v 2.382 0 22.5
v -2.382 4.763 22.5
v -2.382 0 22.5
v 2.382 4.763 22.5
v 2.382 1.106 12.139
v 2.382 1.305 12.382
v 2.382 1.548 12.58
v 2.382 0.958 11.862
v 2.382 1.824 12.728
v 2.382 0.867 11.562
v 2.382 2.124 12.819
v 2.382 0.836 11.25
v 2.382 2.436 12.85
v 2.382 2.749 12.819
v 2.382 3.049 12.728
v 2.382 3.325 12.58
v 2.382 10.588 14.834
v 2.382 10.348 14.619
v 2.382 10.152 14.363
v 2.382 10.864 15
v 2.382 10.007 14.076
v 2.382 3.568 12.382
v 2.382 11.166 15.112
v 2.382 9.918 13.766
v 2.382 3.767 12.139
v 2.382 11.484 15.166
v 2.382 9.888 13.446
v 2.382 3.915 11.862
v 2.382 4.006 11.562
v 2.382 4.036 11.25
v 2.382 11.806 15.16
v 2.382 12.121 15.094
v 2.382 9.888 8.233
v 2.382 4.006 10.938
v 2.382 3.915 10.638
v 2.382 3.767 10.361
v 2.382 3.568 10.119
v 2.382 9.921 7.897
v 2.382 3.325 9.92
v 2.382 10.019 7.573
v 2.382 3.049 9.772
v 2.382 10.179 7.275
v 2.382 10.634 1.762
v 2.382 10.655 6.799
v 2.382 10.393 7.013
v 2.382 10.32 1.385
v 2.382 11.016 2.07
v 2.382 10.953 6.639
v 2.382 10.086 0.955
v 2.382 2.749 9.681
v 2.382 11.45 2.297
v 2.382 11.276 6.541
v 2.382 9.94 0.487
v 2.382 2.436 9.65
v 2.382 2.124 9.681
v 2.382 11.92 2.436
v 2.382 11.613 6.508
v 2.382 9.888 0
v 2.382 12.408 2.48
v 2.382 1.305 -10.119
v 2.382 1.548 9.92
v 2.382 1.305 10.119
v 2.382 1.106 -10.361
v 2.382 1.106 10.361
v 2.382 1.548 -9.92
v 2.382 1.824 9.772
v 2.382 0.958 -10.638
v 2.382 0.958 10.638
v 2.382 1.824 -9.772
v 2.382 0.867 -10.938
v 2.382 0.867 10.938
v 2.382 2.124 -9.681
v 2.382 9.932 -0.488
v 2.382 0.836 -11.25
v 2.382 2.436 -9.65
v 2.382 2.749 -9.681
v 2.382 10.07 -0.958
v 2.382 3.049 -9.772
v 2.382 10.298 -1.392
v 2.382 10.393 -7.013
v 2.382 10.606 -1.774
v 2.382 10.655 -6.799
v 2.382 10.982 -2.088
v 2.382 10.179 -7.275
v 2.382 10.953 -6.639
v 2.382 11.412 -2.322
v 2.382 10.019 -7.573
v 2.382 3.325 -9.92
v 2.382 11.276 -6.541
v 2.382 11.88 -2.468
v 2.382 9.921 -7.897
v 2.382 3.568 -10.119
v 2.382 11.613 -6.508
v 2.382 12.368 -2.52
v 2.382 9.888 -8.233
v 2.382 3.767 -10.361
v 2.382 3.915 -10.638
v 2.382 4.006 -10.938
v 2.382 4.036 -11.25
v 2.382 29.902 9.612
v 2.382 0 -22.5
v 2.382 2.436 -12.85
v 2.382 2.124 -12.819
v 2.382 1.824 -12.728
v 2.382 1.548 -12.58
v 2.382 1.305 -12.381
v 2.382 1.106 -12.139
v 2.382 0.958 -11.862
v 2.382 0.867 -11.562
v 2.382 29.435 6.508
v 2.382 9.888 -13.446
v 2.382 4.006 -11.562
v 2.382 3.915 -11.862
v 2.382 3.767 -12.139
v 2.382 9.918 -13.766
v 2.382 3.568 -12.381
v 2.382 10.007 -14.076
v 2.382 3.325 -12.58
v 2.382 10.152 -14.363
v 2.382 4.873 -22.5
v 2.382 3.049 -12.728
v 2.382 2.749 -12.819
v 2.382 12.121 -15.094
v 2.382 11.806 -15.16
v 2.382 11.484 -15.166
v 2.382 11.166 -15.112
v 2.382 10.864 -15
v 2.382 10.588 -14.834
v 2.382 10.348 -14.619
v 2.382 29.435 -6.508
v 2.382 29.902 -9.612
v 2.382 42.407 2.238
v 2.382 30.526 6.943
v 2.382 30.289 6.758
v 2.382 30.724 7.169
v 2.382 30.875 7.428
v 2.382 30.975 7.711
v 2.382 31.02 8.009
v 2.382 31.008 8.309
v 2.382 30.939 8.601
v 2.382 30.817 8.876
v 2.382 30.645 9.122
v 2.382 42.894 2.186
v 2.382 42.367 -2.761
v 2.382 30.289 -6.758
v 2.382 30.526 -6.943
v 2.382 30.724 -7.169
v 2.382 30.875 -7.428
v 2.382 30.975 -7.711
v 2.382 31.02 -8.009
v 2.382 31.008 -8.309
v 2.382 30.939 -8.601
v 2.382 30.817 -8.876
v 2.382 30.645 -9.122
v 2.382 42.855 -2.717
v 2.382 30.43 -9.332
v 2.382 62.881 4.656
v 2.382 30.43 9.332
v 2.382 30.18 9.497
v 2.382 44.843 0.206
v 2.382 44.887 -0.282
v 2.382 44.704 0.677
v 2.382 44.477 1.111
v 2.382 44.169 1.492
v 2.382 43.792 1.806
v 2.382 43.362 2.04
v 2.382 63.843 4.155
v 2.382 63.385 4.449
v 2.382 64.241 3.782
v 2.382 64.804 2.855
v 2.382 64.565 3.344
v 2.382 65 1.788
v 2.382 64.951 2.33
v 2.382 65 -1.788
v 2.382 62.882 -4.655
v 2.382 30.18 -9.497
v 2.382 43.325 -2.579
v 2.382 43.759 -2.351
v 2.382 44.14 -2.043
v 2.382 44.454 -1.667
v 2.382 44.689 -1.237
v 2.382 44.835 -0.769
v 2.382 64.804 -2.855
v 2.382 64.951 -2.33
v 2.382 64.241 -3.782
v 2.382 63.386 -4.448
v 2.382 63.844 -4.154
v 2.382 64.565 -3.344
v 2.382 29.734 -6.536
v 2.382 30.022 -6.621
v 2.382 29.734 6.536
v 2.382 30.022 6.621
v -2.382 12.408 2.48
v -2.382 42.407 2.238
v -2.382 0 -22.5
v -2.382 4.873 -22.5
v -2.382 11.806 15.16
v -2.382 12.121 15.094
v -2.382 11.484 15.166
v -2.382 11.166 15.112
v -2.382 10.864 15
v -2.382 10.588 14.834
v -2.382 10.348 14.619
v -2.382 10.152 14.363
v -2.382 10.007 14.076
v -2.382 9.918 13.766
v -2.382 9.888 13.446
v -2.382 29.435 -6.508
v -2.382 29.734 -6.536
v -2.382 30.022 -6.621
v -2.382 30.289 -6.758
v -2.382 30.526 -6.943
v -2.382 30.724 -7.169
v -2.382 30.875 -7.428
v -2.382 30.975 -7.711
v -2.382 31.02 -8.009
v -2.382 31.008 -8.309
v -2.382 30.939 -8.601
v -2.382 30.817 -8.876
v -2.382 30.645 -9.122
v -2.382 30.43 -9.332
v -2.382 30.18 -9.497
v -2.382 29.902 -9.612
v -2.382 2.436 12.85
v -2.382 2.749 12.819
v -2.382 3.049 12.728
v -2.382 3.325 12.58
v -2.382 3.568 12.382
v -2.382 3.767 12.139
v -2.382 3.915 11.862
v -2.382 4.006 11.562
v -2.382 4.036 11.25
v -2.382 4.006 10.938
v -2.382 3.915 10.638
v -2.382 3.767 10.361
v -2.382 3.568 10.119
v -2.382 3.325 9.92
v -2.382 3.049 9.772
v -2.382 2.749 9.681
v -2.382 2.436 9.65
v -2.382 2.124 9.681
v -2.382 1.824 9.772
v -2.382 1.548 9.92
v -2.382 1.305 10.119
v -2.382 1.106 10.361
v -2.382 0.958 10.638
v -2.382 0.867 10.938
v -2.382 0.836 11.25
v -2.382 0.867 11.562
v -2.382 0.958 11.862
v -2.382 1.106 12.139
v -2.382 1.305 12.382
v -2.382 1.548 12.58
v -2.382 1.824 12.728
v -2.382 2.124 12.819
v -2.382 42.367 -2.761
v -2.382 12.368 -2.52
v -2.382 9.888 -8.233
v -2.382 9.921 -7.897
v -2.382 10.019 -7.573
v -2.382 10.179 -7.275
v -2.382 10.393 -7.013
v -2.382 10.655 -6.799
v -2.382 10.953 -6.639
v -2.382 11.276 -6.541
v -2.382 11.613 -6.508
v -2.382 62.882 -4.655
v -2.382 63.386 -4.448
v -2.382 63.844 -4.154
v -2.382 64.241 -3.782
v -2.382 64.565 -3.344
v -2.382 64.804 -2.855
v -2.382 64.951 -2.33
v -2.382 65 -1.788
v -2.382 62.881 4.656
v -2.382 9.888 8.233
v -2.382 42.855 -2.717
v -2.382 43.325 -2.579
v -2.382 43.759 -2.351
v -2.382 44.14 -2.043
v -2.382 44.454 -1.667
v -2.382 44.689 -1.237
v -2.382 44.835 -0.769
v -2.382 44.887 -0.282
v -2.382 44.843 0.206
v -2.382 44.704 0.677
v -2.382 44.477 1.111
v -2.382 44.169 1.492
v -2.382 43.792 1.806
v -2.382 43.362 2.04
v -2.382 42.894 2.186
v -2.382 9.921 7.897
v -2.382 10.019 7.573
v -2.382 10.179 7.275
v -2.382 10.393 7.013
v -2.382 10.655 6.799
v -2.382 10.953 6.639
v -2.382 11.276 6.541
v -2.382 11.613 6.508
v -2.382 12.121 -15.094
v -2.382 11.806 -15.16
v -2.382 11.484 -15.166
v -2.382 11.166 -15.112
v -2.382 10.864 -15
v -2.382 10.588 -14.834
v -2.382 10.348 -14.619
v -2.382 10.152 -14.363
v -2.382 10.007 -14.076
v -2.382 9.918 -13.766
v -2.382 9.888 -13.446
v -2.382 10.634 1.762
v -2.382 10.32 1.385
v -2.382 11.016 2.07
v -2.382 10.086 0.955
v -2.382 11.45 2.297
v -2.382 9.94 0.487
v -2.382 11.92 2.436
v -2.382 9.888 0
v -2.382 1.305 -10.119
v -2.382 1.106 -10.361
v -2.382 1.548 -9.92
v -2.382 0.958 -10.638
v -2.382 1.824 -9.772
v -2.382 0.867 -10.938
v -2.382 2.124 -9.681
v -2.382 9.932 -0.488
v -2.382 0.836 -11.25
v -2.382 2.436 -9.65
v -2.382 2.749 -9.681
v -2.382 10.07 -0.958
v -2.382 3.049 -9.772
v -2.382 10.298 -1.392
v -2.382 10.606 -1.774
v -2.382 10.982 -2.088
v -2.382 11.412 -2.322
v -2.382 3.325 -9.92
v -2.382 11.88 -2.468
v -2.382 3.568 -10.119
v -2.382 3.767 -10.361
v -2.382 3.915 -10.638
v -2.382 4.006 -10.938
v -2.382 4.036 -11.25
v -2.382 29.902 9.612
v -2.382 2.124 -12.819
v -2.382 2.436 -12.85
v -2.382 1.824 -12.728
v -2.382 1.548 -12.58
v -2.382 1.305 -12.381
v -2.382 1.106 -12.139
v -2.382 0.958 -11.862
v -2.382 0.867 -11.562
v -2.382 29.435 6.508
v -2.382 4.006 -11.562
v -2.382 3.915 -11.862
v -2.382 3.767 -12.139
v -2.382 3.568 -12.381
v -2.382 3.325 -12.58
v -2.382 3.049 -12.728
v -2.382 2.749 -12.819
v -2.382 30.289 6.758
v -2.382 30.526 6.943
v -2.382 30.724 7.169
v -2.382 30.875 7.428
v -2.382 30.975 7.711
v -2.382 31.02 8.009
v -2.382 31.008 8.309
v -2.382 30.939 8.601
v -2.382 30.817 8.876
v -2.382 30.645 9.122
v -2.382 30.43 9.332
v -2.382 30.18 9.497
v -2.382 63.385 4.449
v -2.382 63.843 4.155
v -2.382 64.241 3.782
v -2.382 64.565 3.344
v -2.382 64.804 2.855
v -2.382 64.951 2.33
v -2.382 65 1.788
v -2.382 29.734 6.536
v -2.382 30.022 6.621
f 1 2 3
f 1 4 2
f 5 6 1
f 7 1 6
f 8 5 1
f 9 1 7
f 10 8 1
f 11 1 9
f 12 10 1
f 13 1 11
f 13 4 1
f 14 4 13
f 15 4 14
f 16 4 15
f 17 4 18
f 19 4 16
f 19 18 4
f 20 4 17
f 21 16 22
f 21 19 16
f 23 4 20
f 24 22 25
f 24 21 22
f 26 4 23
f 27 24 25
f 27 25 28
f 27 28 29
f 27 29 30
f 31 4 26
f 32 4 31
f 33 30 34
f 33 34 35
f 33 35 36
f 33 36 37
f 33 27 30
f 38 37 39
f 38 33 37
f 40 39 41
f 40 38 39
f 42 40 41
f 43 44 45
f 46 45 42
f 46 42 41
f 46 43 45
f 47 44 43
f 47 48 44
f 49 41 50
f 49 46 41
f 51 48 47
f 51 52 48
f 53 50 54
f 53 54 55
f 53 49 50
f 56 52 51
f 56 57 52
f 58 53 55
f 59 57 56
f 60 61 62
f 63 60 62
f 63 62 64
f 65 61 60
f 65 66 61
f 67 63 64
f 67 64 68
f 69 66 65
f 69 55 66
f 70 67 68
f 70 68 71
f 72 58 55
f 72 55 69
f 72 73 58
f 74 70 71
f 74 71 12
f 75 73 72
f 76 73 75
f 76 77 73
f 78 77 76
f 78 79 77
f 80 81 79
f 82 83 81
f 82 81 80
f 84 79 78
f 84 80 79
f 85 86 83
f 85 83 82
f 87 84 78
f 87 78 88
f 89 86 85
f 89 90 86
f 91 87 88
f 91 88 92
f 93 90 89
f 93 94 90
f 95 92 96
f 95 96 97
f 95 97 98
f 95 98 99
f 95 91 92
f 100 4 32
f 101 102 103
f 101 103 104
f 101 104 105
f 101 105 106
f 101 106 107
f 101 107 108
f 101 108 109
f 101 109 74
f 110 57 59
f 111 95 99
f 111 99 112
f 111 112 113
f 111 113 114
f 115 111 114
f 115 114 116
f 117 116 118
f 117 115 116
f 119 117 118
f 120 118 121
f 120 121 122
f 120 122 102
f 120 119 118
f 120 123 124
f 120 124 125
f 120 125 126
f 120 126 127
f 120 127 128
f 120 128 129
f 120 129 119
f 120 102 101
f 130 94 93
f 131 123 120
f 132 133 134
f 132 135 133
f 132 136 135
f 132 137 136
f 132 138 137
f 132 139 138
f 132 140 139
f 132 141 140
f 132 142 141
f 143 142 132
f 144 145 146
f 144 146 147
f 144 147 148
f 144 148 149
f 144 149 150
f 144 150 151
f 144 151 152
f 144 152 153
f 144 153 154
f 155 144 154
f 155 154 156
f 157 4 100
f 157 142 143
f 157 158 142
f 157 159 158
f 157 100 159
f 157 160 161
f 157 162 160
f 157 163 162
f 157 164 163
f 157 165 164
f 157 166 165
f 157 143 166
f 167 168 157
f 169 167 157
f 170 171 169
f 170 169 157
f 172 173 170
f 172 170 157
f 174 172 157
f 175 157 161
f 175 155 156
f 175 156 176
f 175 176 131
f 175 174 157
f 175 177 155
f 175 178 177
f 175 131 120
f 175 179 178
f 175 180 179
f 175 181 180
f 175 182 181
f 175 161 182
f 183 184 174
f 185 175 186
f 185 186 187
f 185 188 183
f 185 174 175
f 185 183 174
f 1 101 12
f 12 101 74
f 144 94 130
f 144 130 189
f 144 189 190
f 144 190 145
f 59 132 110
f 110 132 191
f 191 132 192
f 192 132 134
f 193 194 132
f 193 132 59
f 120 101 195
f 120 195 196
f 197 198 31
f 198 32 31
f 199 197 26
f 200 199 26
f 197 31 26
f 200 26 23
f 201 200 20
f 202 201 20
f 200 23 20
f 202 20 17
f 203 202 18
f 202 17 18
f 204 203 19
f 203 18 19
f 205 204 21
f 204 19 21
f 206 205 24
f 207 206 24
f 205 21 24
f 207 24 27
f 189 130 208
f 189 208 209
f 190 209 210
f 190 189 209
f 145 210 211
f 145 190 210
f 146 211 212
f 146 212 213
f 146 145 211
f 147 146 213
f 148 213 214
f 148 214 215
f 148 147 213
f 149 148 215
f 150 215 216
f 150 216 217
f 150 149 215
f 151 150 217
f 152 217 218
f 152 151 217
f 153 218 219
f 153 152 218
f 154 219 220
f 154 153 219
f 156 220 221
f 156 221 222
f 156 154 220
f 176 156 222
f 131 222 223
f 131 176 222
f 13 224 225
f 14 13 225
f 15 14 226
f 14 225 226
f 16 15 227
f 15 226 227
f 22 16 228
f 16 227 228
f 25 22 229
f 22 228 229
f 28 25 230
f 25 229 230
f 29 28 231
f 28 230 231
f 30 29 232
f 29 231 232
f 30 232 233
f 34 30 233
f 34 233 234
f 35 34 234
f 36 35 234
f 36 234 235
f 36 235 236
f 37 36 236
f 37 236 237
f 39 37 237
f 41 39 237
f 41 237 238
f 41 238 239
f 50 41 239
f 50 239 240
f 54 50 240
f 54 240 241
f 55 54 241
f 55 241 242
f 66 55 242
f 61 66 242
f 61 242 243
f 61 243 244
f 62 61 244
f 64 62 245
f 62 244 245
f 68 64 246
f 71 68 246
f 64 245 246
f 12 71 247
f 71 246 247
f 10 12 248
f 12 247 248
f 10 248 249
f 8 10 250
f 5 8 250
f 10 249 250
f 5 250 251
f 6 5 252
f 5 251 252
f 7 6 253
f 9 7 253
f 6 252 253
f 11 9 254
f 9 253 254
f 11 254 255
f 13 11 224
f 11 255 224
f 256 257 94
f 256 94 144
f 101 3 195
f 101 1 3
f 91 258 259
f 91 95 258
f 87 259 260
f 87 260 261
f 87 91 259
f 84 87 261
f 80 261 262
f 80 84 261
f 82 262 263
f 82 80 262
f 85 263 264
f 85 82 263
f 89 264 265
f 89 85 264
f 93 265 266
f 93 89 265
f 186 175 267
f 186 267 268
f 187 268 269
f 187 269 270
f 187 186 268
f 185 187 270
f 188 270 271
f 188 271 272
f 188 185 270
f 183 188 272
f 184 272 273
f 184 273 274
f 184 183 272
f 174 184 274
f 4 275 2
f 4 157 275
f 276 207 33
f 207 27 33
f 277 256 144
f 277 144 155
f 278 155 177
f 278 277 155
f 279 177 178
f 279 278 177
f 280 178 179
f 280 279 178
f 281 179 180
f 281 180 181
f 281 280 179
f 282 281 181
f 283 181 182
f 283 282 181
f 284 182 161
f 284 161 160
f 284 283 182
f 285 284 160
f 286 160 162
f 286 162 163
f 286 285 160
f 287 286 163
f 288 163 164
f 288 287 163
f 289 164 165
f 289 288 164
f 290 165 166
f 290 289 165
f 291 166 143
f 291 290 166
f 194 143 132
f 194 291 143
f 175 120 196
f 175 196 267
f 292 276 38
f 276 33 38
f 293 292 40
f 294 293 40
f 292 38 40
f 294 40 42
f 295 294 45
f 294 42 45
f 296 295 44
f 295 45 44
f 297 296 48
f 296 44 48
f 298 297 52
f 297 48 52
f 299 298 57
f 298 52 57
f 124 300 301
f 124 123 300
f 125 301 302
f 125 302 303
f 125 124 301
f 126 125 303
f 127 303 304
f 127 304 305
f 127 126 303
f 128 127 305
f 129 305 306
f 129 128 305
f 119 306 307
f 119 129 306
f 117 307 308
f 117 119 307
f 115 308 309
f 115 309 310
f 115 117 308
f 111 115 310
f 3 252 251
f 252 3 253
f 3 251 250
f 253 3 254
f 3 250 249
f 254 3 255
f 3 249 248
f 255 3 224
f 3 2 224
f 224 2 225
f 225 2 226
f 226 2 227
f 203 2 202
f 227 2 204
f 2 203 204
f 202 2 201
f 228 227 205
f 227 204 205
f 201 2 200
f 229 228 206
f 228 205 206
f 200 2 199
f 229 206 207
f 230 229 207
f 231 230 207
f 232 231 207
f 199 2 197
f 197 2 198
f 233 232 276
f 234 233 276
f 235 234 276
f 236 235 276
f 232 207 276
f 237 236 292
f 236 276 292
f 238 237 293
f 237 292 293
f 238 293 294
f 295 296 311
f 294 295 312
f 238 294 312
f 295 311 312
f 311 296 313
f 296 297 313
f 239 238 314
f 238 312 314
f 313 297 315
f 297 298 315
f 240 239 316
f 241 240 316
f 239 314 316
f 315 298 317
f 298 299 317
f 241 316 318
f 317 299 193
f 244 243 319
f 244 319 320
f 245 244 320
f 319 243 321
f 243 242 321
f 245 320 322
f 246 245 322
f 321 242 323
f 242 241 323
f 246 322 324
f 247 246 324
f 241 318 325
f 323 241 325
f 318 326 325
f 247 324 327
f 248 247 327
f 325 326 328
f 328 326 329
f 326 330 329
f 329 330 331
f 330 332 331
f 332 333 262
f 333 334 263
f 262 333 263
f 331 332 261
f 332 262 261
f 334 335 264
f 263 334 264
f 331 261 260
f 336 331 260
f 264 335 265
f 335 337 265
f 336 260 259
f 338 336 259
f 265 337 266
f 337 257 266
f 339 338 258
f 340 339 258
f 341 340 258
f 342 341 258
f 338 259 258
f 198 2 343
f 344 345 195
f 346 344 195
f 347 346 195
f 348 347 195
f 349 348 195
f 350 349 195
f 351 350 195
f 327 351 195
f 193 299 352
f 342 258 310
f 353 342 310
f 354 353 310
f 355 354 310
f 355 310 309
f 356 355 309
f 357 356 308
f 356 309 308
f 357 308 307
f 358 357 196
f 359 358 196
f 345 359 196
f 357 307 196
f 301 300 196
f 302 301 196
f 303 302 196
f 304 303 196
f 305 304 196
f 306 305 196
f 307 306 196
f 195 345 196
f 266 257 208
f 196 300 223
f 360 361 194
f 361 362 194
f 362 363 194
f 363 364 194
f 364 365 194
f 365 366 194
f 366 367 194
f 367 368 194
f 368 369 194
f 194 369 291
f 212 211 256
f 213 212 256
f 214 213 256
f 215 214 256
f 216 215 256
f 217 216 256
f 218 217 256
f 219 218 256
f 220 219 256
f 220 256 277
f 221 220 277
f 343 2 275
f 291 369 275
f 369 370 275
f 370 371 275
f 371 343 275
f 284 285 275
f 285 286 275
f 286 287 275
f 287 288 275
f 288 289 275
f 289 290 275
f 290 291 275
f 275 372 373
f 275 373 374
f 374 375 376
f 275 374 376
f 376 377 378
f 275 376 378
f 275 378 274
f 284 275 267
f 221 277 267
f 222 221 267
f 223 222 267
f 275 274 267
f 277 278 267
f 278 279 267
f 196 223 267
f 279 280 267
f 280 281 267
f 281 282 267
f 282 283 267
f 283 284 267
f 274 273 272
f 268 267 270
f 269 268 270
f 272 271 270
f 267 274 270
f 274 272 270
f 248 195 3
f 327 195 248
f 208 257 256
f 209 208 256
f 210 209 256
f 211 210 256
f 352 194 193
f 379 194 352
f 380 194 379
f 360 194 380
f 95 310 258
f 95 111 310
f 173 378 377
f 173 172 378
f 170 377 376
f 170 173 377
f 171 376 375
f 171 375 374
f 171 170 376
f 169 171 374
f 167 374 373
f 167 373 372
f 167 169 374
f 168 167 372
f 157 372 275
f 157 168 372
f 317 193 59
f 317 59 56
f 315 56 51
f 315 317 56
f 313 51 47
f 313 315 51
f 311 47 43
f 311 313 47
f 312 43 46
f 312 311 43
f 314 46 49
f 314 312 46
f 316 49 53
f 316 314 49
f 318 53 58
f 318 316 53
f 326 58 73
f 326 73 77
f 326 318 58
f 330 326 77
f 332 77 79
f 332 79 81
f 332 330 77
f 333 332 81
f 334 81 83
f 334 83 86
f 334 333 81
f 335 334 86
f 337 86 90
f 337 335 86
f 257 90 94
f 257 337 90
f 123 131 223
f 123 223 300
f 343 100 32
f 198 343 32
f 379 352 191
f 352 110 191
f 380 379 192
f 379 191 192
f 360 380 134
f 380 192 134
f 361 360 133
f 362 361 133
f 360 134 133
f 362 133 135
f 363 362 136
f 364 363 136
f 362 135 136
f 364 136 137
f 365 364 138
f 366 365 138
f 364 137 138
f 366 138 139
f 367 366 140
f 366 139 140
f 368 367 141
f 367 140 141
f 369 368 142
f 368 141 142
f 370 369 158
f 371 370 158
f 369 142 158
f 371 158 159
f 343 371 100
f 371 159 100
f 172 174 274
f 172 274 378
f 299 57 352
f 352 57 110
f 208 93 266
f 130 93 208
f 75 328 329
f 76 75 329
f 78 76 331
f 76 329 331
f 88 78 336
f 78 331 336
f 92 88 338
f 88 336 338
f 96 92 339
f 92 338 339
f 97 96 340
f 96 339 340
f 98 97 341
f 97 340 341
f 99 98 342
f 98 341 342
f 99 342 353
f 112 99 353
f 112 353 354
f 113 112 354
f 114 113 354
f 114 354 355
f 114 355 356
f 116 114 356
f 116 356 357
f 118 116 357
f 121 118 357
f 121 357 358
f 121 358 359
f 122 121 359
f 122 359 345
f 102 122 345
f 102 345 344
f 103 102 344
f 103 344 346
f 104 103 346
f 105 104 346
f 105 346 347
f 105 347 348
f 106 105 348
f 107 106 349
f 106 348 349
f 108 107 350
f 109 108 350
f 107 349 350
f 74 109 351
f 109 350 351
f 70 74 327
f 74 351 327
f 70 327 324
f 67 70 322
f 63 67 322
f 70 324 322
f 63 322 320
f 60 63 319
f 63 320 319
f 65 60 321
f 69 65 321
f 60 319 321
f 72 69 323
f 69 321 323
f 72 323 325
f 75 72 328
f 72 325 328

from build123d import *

# Parameters (mm, degrees)
BOSS_EXTRUDE1_DEPTH       = 2.3815
M3_CLEARANCE_HOLE1_D      = 3.2
F_1_0MM_START             = -2.3815
F_1_0MM_DOWEL_SLOT1_DEPTH = 4.763


# Read off the part's stored shape, not the designer's step: Ø1.0mm Dowel Slot1
with BuildPart() as part:
    # Sketch1 → Boss-Extrude1 (new, symmetric)
    with BuildSketch(Plane(origin=(0, 0, 0), x_dir=(0, 0, -1), z_dir=(1, 0, 0))):
        with BuildLine():
            Line((-22.5, 0), (22.5, 0))
            Line((22.5, 0), (22.5, 4.873))
            Line((22.5, 4.873), (4.655163533, 62.882072013))
            ThreePointArc((4.655163533, 62.882072013), (3.570153218, 64.413111688), (1.787769426, 65))
            Line((1.787769426, 65), (-1.787769426, 65))
            ThreePointArc((-1.787769426, 65), (-3.570795025, 64.412637502), (-4.655632377, 62.880546477))
            Line((-4.655632377, 62.880546477), (-22.5, 4.763))
            Line((-22.5, 4.763), (-22.5, 0))
        make_face()
        with BuildLine():
            Line((6.507919955, 11.613028191), (6.507919955, 29.434537867))
            ThreePointArc((6.507919955, 29.434537867), (7.858931987, 31.004324378), (9.612461298, 29.90223629))
            Line((9.612461298, 29.90223629), (15.094257994, 12.121307765))
            ThreePointArc((15.094257994, 12.121307765), (14.833637596, 10.588440441), (13.445586349, 9.887784348))
            Line((13.445586349, 9.887784348), (8.233163799, 9.887784348))
            ThreePointArc((8.233163799, 9.887784348), (7.013232178, 10.39309657), (6.507919955, 11.613028191))
        make_face(mode=Mode.SUBTRACT)
        with BuildLine():
            Line((-9.612461298, 29.90223629), (-15.094257994, 12.121307765))
            ThreePointArc((-15.094257994, 12.121307765), (-14.833637596, 10.588440441), (-13.445586349, 9.887784348))
            Line((-13.445586349, 9.887784348), (-8.233163799, 9.887784348))
            ThreePointArc((-8.233163799, 9.887784348), (-7.013232178, 10.39309657), (-6.507919955, 11.613028191))
            Line((-6.507919955, 11.613028191), (-6.507919955, 29.434537867))
            ThreePointArc((-6.507919955, 29.434537867), (-7.858931987, 31.004324378), (-9.612461298, 29.90223629))
        make_face(mode=Mode.SUBTRACT)
    extrude(amount=BOSS_EXTRUDE1_DEPTH, both=True)

    # M3 Clearance Hole1 (through all)
    with Locations(Plane(origin=(2.3815, 0, 0), x_dir=(0, 0, -1), z_dir=(1, 0, 0))):
        with Locations((11.25, 2.4365), (-11.250134442, 2.436499343)):
            Hole(M3_CLEARANCE_HOLE1_D / 2)

    # Ø1.0mm Dowel Slot1 outline → Ø1.0mm Dowel Slot1 (cut)
    with BuildSketch(Plane.YZ.offset(F_1_0MM_START)):
        with BuildLine():
            Line((12.367584087, -2.520038343), (42.366612584, -2.761469965))
            ThreePointArc((42.366612584, -2.761469965), (44.886650928, -0.281670226), (42.406851188, 2.238368118))
            Line((42.406851188, 2.238368118), (12.407822691, 2.47979974))
            ThreePointArc((12.407822691, 2.47979974), (9.887784348, 0), (12.367584087, -2.520038343))
        make_face()
    extrude(amount=F_1_0MM_DOWEL_SLOT1_DEPTH, mode=Mode.SUBTRACT)


solid = part.part
